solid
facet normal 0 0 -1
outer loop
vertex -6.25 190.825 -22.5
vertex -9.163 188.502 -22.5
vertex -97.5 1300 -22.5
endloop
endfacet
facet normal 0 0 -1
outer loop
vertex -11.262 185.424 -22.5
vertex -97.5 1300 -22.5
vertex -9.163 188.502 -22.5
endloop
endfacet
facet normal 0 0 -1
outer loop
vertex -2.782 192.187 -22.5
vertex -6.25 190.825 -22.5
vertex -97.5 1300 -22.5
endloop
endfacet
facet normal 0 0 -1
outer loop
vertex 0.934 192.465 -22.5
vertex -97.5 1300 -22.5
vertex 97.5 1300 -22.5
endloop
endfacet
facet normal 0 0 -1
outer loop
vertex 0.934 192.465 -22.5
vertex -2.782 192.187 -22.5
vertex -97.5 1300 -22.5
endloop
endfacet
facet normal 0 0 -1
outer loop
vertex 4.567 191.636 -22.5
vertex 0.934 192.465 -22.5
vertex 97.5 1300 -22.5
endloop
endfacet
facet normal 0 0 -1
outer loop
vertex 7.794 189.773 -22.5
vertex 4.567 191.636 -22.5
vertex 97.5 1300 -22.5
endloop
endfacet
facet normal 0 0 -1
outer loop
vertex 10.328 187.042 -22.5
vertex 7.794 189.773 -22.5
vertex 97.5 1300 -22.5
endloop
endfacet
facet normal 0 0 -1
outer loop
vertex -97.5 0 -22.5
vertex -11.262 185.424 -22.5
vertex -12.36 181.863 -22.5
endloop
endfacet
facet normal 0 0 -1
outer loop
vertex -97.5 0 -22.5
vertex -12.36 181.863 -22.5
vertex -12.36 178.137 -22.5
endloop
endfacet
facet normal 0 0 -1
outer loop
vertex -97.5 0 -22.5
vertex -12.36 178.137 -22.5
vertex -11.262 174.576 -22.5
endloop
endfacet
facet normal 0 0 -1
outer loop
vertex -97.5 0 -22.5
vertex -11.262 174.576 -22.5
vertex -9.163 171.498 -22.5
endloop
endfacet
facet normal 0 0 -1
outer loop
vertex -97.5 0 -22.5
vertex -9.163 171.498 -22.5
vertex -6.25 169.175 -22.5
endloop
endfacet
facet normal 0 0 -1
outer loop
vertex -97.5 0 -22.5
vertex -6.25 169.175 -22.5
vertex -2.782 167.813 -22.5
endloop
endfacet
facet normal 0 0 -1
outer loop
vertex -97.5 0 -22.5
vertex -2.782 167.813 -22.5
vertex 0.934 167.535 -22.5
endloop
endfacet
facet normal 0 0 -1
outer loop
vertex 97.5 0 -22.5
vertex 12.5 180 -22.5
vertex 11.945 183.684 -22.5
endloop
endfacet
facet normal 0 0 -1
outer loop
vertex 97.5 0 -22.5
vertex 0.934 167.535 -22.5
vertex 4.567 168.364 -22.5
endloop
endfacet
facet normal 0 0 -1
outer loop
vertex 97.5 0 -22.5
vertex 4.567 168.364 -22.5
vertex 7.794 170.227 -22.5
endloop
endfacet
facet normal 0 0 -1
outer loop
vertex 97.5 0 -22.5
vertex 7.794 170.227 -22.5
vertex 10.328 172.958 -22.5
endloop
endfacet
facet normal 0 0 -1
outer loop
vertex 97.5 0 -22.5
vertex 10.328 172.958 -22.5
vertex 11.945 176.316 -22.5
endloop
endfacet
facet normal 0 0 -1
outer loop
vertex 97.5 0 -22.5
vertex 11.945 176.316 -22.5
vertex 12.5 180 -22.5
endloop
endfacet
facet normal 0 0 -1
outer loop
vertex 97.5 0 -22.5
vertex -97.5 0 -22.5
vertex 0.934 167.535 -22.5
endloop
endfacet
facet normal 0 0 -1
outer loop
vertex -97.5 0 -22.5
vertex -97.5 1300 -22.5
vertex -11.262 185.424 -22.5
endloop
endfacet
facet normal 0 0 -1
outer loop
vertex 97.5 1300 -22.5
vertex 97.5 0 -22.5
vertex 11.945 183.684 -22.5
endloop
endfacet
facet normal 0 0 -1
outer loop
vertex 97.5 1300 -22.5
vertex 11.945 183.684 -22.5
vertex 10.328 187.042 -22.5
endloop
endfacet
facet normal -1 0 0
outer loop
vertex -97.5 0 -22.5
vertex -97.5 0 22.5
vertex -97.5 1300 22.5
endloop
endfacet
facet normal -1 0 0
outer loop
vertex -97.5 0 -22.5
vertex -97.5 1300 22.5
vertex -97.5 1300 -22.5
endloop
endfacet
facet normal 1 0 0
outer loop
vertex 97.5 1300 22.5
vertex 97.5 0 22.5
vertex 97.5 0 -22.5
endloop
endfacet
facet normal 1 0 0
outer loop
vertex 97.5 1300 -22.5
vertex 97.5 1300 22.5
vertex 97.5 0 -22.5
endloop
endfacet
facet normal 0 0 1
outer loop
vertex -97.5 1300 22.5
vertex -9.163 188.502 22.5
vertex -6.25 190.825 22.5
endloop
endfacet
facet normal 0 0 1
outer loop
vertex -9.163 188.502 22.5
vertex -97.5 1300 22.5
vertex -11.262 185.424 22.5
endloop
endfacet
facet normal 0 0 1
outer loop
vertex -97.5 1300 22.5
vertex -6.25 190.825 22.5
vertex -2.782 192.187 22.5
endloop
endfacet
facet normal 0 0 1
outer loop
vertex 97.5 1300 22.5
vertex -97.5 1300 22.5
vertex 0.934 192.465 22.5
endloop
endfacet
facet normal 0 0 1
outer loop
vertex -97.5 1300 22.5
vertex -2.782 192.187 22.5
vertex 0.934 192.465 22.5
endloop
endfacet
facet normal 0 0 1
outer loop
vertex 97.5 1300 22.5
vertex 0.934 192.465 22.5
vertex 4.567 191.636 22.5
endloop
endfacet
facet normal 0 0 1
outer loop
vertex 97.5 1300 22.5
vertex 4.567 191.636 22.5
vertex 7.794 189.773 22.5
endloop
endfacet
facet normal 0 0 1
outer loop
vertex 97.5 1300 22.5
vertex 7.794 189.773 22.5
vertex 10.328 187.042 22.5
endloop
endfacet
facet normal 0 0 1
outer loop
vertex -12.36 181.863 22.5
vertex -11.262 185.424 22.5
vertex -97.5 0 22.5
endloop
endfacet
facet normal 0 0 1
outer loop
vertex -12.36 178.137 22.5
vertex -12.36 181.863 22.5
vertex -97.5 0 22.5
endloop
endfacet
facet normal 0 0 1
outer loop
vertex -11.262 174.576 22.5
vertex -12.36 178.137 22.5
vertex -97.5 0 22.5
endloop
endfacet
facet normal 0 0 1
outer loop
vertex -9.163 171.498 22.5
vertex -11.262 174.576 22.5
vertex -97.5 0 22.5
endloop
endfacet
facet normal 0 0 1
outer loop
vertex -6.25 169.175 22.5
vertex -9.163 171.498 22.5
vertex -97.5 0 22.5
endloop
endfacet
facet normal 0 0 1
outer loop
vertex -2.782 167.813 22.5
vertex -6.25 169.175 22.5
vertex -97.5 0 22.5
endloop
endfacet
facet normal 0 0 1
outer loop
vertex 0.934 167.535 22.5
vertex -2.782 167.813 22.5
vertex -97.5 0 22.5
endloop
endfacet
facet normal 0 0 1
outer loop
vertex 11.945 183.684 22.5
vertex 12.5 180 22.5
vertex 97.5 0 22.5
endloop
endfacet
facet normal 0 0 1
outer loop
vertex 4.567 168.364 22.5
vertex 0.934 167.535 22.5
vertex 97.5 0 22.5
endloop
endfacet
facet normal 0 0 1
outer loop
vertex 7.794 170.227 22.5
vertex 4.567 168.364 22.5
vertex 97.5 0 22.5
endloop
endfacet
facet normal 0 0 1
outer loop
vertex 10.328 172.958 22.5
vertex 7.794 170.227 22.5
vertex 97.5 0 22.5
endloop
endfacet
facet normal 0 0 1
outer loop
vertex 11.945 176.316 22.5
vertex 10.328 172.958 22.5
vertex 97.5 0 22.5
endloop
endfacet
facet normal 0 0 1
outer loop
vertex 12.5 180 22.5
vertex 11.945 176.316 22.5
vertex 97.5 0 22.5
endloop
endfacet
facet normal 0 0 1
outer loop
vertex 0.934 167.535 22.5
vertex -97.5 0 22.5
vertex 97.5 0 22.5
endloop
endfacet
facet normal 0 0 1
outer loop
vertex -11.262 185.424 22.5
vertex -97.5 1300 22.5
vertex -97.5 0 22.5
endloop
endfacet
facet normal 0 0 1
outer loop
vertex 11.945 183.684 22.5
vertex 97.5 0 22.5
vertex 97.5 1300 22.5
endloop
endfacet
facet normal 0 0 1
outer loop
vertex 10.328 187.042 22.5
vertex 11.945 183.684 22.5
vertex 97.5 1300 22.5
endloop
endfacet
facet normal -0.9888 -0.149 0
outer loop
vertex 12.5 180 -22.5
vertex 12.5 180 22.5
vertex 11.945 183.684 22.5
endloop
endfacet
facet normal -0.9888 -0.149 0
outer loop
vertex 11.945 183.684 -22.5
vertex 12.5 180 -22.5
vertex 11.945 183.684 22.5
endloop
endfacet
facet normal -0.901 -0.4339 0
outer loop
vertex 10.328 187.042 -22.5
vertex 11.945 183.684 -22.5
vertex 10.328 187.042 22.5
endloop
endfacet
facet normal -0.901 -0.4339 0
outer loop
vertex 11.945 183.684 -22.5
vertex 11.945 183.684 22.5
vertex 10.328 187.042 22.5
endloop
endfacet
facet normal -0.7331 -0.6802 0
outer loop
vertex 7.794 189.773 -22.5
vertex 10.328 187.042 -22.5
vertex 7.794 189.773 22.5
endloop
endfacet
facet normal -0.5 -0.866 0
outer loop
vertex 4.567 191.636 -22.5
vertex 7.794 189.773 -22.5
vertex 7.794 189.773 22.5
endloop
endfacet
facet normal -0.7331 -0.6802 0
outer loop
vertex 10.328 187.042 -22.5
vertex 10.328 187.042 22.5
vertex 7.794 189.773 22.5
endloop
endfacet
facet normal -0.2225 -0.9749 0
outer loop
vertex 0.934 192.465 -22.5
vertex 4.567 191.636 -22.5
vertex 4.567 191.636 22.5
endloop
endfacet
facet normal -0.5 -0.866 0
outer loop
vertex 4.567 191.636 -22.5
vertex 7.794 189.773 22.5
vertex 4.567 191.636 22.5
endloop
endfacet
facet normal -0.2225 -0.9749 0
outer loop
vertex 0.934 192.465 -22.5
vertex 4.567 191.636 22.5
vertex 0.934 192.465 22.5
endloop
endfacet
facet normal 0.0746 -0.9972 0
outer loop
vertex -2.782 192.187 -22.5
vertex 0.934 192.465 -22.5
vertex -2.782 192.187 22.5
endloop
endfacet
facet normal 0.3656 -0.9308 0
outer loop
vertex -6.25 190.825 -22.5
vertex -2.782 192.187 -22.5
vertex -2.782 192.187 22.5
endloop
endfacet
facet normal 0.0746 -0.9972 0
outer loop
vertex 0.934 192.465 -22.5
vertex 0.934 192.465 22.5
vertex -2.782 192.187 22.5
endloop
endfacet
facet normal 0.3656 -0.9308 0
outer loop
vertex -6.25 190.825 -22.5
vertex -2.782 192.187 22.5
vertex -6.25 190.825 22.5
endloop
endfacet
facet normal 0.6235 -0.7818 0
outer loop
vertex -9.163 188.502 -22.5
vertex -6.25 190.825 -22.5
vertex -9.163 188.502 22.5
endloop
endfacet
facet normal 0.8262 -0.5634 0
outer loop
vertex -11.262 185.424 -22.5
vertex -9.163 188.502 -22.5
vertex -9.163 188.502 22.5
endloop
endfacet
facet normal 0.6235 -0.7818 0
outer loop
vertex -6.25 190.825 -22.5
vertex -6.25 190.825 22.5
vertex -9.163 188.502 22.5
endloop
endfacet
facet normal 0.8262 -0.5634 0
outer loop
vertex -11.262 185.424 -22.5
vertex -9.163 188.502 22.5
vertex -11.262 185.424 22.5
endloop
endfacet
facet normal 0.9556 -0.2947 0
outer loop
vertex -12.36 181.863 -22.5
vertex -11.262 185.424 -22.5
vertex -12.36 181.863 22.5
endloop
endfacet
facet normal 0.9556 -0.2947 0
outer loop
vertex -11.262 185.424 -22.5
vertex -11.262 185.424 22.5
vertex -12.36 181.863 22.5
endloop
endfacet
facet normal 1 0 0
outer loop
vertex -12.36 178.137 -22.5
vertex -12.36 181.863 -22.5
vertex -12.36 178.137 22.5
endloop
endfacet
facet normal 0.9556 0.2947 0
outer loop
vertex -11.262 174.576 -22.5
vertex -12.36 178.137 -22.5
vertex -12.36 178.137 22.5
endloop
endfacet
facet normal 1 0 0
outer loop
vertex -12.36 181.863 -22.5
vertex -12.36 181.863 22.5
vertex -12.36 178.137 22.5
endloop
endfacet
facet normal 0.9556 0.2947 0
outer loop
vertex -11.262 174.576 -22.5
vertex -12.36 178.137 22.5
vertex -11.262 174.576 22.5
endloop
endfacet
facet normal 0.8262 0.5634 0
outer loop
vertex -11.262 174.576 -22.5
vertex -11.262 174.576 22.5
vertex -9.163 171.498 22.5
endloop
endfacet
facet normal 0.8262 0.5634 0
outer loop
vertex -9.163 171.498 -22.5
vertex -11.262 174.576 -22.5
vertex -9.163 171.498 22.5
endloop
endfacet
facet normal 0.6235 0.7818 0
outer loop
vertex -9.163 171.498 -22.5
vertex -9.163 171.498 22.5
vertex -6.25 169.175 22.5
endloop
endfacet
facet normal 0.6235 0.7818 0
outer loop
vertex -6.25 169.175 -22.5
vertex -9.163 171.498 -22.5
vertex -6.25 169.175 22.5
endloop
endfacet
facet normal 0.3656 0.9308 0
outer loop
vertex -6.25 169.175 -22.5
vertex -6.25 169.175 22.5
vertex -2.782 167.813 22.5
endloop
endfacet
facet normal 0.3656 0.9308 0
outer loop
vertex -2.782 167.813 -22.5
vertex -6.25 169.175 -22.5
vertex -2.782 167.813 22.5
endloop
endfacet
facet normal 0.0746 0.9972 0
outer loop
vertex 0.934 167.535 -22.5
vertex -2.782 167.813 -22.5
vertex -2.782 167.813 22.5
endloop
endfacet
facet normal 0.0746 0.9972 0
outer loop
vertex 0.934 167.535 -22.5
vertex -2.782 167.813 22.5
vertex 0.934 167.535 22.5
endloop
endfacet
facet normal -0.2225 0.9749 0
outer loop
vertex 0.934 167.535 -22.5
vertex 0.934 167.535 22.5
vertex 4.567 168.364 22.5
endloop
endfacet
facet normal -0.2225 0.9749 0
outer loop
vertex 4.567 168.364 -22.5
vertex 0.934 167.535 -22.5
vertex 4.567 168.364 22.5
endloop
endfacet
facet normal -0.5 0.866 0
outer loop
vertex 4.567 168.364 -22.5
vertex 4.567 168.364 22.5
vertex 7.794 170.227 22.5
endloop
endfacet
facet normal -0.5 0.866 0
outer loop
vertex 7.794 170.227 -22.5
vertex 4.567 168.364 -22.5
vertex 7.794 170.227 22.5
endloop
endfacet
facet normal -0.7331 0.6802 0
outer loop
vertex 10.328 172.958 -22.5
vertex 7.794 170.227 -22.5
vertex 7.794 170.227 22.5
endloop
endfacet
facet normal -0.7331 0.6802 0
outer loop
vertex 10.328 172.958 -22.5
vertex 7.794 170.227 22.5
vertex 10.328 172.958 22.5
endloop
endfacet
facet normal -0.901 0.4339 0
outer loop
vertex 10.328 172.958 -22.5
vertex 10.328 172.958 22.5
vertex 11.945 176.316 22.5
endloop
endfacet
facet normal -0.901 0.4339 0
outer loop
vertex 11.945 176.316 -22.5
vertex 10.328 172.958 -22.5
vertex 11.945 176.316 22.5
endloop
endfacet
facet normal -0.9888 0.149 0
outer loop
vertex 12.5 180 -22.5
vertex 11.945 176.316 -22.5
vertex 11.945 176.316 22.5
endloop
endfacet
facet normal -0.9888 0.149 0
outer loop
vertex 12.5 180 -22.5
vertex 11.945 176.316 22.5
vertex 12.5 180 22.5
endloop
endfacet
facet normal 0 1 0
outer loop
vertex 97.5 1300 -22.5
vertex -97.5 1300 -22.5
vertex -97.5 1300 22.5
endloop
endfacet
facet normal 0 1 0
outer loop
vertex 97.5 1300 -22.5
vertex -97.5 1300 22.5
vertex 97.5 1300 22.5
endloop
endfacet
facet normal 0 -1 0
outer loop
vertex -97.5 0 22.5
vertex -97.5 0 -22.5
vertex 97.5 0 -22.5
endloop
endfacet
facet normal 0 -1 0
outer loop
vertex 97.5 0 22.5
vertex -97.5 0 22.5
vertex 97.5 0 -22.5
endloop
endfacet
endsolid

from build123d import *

# Parameters (mm, degrees)
SKETCH1_W          = 195
SKETCH1_H          = 45
SHAPE_DEPTH        = 1300
CUT_EXTRUDE1_REACH = 47
SKETCH2_R          = 12.5


with BuildPart() as part:
    # Sketch1 → Shape (new body)
    with BuildSketch(Plane(origin=(0, 0, 0), x_dir=(1, 0, 0), z_dir=(0, 1, 0))):
        Rectangle(SKETCH1_W, SKETCH1_H)
    extrude(amount=SHAPE_DEPTH)

    # Sketch2 → Cut-Extrude1 (cut, up to next)
    with BuildSketch(Plane.XY.offset(22.5), mode=Mode.PRIVATE) as cut_extrude1_sk1:
        with Locations((0, 180)):
            Circle(SKETCH2_R)
    cut_extrude1_tool1 = extrude(cut_extrude1_sk1.sketch, amount=-CUT_EXTRUDE1_REACH, mode=Mode.PRIVATE) & part.part
    add(cut_extrude1_tool1.solids().sort_by_distance((0, 180, 22.5))[0], mode=Mode.SUBTRACT)


solid = part.part
